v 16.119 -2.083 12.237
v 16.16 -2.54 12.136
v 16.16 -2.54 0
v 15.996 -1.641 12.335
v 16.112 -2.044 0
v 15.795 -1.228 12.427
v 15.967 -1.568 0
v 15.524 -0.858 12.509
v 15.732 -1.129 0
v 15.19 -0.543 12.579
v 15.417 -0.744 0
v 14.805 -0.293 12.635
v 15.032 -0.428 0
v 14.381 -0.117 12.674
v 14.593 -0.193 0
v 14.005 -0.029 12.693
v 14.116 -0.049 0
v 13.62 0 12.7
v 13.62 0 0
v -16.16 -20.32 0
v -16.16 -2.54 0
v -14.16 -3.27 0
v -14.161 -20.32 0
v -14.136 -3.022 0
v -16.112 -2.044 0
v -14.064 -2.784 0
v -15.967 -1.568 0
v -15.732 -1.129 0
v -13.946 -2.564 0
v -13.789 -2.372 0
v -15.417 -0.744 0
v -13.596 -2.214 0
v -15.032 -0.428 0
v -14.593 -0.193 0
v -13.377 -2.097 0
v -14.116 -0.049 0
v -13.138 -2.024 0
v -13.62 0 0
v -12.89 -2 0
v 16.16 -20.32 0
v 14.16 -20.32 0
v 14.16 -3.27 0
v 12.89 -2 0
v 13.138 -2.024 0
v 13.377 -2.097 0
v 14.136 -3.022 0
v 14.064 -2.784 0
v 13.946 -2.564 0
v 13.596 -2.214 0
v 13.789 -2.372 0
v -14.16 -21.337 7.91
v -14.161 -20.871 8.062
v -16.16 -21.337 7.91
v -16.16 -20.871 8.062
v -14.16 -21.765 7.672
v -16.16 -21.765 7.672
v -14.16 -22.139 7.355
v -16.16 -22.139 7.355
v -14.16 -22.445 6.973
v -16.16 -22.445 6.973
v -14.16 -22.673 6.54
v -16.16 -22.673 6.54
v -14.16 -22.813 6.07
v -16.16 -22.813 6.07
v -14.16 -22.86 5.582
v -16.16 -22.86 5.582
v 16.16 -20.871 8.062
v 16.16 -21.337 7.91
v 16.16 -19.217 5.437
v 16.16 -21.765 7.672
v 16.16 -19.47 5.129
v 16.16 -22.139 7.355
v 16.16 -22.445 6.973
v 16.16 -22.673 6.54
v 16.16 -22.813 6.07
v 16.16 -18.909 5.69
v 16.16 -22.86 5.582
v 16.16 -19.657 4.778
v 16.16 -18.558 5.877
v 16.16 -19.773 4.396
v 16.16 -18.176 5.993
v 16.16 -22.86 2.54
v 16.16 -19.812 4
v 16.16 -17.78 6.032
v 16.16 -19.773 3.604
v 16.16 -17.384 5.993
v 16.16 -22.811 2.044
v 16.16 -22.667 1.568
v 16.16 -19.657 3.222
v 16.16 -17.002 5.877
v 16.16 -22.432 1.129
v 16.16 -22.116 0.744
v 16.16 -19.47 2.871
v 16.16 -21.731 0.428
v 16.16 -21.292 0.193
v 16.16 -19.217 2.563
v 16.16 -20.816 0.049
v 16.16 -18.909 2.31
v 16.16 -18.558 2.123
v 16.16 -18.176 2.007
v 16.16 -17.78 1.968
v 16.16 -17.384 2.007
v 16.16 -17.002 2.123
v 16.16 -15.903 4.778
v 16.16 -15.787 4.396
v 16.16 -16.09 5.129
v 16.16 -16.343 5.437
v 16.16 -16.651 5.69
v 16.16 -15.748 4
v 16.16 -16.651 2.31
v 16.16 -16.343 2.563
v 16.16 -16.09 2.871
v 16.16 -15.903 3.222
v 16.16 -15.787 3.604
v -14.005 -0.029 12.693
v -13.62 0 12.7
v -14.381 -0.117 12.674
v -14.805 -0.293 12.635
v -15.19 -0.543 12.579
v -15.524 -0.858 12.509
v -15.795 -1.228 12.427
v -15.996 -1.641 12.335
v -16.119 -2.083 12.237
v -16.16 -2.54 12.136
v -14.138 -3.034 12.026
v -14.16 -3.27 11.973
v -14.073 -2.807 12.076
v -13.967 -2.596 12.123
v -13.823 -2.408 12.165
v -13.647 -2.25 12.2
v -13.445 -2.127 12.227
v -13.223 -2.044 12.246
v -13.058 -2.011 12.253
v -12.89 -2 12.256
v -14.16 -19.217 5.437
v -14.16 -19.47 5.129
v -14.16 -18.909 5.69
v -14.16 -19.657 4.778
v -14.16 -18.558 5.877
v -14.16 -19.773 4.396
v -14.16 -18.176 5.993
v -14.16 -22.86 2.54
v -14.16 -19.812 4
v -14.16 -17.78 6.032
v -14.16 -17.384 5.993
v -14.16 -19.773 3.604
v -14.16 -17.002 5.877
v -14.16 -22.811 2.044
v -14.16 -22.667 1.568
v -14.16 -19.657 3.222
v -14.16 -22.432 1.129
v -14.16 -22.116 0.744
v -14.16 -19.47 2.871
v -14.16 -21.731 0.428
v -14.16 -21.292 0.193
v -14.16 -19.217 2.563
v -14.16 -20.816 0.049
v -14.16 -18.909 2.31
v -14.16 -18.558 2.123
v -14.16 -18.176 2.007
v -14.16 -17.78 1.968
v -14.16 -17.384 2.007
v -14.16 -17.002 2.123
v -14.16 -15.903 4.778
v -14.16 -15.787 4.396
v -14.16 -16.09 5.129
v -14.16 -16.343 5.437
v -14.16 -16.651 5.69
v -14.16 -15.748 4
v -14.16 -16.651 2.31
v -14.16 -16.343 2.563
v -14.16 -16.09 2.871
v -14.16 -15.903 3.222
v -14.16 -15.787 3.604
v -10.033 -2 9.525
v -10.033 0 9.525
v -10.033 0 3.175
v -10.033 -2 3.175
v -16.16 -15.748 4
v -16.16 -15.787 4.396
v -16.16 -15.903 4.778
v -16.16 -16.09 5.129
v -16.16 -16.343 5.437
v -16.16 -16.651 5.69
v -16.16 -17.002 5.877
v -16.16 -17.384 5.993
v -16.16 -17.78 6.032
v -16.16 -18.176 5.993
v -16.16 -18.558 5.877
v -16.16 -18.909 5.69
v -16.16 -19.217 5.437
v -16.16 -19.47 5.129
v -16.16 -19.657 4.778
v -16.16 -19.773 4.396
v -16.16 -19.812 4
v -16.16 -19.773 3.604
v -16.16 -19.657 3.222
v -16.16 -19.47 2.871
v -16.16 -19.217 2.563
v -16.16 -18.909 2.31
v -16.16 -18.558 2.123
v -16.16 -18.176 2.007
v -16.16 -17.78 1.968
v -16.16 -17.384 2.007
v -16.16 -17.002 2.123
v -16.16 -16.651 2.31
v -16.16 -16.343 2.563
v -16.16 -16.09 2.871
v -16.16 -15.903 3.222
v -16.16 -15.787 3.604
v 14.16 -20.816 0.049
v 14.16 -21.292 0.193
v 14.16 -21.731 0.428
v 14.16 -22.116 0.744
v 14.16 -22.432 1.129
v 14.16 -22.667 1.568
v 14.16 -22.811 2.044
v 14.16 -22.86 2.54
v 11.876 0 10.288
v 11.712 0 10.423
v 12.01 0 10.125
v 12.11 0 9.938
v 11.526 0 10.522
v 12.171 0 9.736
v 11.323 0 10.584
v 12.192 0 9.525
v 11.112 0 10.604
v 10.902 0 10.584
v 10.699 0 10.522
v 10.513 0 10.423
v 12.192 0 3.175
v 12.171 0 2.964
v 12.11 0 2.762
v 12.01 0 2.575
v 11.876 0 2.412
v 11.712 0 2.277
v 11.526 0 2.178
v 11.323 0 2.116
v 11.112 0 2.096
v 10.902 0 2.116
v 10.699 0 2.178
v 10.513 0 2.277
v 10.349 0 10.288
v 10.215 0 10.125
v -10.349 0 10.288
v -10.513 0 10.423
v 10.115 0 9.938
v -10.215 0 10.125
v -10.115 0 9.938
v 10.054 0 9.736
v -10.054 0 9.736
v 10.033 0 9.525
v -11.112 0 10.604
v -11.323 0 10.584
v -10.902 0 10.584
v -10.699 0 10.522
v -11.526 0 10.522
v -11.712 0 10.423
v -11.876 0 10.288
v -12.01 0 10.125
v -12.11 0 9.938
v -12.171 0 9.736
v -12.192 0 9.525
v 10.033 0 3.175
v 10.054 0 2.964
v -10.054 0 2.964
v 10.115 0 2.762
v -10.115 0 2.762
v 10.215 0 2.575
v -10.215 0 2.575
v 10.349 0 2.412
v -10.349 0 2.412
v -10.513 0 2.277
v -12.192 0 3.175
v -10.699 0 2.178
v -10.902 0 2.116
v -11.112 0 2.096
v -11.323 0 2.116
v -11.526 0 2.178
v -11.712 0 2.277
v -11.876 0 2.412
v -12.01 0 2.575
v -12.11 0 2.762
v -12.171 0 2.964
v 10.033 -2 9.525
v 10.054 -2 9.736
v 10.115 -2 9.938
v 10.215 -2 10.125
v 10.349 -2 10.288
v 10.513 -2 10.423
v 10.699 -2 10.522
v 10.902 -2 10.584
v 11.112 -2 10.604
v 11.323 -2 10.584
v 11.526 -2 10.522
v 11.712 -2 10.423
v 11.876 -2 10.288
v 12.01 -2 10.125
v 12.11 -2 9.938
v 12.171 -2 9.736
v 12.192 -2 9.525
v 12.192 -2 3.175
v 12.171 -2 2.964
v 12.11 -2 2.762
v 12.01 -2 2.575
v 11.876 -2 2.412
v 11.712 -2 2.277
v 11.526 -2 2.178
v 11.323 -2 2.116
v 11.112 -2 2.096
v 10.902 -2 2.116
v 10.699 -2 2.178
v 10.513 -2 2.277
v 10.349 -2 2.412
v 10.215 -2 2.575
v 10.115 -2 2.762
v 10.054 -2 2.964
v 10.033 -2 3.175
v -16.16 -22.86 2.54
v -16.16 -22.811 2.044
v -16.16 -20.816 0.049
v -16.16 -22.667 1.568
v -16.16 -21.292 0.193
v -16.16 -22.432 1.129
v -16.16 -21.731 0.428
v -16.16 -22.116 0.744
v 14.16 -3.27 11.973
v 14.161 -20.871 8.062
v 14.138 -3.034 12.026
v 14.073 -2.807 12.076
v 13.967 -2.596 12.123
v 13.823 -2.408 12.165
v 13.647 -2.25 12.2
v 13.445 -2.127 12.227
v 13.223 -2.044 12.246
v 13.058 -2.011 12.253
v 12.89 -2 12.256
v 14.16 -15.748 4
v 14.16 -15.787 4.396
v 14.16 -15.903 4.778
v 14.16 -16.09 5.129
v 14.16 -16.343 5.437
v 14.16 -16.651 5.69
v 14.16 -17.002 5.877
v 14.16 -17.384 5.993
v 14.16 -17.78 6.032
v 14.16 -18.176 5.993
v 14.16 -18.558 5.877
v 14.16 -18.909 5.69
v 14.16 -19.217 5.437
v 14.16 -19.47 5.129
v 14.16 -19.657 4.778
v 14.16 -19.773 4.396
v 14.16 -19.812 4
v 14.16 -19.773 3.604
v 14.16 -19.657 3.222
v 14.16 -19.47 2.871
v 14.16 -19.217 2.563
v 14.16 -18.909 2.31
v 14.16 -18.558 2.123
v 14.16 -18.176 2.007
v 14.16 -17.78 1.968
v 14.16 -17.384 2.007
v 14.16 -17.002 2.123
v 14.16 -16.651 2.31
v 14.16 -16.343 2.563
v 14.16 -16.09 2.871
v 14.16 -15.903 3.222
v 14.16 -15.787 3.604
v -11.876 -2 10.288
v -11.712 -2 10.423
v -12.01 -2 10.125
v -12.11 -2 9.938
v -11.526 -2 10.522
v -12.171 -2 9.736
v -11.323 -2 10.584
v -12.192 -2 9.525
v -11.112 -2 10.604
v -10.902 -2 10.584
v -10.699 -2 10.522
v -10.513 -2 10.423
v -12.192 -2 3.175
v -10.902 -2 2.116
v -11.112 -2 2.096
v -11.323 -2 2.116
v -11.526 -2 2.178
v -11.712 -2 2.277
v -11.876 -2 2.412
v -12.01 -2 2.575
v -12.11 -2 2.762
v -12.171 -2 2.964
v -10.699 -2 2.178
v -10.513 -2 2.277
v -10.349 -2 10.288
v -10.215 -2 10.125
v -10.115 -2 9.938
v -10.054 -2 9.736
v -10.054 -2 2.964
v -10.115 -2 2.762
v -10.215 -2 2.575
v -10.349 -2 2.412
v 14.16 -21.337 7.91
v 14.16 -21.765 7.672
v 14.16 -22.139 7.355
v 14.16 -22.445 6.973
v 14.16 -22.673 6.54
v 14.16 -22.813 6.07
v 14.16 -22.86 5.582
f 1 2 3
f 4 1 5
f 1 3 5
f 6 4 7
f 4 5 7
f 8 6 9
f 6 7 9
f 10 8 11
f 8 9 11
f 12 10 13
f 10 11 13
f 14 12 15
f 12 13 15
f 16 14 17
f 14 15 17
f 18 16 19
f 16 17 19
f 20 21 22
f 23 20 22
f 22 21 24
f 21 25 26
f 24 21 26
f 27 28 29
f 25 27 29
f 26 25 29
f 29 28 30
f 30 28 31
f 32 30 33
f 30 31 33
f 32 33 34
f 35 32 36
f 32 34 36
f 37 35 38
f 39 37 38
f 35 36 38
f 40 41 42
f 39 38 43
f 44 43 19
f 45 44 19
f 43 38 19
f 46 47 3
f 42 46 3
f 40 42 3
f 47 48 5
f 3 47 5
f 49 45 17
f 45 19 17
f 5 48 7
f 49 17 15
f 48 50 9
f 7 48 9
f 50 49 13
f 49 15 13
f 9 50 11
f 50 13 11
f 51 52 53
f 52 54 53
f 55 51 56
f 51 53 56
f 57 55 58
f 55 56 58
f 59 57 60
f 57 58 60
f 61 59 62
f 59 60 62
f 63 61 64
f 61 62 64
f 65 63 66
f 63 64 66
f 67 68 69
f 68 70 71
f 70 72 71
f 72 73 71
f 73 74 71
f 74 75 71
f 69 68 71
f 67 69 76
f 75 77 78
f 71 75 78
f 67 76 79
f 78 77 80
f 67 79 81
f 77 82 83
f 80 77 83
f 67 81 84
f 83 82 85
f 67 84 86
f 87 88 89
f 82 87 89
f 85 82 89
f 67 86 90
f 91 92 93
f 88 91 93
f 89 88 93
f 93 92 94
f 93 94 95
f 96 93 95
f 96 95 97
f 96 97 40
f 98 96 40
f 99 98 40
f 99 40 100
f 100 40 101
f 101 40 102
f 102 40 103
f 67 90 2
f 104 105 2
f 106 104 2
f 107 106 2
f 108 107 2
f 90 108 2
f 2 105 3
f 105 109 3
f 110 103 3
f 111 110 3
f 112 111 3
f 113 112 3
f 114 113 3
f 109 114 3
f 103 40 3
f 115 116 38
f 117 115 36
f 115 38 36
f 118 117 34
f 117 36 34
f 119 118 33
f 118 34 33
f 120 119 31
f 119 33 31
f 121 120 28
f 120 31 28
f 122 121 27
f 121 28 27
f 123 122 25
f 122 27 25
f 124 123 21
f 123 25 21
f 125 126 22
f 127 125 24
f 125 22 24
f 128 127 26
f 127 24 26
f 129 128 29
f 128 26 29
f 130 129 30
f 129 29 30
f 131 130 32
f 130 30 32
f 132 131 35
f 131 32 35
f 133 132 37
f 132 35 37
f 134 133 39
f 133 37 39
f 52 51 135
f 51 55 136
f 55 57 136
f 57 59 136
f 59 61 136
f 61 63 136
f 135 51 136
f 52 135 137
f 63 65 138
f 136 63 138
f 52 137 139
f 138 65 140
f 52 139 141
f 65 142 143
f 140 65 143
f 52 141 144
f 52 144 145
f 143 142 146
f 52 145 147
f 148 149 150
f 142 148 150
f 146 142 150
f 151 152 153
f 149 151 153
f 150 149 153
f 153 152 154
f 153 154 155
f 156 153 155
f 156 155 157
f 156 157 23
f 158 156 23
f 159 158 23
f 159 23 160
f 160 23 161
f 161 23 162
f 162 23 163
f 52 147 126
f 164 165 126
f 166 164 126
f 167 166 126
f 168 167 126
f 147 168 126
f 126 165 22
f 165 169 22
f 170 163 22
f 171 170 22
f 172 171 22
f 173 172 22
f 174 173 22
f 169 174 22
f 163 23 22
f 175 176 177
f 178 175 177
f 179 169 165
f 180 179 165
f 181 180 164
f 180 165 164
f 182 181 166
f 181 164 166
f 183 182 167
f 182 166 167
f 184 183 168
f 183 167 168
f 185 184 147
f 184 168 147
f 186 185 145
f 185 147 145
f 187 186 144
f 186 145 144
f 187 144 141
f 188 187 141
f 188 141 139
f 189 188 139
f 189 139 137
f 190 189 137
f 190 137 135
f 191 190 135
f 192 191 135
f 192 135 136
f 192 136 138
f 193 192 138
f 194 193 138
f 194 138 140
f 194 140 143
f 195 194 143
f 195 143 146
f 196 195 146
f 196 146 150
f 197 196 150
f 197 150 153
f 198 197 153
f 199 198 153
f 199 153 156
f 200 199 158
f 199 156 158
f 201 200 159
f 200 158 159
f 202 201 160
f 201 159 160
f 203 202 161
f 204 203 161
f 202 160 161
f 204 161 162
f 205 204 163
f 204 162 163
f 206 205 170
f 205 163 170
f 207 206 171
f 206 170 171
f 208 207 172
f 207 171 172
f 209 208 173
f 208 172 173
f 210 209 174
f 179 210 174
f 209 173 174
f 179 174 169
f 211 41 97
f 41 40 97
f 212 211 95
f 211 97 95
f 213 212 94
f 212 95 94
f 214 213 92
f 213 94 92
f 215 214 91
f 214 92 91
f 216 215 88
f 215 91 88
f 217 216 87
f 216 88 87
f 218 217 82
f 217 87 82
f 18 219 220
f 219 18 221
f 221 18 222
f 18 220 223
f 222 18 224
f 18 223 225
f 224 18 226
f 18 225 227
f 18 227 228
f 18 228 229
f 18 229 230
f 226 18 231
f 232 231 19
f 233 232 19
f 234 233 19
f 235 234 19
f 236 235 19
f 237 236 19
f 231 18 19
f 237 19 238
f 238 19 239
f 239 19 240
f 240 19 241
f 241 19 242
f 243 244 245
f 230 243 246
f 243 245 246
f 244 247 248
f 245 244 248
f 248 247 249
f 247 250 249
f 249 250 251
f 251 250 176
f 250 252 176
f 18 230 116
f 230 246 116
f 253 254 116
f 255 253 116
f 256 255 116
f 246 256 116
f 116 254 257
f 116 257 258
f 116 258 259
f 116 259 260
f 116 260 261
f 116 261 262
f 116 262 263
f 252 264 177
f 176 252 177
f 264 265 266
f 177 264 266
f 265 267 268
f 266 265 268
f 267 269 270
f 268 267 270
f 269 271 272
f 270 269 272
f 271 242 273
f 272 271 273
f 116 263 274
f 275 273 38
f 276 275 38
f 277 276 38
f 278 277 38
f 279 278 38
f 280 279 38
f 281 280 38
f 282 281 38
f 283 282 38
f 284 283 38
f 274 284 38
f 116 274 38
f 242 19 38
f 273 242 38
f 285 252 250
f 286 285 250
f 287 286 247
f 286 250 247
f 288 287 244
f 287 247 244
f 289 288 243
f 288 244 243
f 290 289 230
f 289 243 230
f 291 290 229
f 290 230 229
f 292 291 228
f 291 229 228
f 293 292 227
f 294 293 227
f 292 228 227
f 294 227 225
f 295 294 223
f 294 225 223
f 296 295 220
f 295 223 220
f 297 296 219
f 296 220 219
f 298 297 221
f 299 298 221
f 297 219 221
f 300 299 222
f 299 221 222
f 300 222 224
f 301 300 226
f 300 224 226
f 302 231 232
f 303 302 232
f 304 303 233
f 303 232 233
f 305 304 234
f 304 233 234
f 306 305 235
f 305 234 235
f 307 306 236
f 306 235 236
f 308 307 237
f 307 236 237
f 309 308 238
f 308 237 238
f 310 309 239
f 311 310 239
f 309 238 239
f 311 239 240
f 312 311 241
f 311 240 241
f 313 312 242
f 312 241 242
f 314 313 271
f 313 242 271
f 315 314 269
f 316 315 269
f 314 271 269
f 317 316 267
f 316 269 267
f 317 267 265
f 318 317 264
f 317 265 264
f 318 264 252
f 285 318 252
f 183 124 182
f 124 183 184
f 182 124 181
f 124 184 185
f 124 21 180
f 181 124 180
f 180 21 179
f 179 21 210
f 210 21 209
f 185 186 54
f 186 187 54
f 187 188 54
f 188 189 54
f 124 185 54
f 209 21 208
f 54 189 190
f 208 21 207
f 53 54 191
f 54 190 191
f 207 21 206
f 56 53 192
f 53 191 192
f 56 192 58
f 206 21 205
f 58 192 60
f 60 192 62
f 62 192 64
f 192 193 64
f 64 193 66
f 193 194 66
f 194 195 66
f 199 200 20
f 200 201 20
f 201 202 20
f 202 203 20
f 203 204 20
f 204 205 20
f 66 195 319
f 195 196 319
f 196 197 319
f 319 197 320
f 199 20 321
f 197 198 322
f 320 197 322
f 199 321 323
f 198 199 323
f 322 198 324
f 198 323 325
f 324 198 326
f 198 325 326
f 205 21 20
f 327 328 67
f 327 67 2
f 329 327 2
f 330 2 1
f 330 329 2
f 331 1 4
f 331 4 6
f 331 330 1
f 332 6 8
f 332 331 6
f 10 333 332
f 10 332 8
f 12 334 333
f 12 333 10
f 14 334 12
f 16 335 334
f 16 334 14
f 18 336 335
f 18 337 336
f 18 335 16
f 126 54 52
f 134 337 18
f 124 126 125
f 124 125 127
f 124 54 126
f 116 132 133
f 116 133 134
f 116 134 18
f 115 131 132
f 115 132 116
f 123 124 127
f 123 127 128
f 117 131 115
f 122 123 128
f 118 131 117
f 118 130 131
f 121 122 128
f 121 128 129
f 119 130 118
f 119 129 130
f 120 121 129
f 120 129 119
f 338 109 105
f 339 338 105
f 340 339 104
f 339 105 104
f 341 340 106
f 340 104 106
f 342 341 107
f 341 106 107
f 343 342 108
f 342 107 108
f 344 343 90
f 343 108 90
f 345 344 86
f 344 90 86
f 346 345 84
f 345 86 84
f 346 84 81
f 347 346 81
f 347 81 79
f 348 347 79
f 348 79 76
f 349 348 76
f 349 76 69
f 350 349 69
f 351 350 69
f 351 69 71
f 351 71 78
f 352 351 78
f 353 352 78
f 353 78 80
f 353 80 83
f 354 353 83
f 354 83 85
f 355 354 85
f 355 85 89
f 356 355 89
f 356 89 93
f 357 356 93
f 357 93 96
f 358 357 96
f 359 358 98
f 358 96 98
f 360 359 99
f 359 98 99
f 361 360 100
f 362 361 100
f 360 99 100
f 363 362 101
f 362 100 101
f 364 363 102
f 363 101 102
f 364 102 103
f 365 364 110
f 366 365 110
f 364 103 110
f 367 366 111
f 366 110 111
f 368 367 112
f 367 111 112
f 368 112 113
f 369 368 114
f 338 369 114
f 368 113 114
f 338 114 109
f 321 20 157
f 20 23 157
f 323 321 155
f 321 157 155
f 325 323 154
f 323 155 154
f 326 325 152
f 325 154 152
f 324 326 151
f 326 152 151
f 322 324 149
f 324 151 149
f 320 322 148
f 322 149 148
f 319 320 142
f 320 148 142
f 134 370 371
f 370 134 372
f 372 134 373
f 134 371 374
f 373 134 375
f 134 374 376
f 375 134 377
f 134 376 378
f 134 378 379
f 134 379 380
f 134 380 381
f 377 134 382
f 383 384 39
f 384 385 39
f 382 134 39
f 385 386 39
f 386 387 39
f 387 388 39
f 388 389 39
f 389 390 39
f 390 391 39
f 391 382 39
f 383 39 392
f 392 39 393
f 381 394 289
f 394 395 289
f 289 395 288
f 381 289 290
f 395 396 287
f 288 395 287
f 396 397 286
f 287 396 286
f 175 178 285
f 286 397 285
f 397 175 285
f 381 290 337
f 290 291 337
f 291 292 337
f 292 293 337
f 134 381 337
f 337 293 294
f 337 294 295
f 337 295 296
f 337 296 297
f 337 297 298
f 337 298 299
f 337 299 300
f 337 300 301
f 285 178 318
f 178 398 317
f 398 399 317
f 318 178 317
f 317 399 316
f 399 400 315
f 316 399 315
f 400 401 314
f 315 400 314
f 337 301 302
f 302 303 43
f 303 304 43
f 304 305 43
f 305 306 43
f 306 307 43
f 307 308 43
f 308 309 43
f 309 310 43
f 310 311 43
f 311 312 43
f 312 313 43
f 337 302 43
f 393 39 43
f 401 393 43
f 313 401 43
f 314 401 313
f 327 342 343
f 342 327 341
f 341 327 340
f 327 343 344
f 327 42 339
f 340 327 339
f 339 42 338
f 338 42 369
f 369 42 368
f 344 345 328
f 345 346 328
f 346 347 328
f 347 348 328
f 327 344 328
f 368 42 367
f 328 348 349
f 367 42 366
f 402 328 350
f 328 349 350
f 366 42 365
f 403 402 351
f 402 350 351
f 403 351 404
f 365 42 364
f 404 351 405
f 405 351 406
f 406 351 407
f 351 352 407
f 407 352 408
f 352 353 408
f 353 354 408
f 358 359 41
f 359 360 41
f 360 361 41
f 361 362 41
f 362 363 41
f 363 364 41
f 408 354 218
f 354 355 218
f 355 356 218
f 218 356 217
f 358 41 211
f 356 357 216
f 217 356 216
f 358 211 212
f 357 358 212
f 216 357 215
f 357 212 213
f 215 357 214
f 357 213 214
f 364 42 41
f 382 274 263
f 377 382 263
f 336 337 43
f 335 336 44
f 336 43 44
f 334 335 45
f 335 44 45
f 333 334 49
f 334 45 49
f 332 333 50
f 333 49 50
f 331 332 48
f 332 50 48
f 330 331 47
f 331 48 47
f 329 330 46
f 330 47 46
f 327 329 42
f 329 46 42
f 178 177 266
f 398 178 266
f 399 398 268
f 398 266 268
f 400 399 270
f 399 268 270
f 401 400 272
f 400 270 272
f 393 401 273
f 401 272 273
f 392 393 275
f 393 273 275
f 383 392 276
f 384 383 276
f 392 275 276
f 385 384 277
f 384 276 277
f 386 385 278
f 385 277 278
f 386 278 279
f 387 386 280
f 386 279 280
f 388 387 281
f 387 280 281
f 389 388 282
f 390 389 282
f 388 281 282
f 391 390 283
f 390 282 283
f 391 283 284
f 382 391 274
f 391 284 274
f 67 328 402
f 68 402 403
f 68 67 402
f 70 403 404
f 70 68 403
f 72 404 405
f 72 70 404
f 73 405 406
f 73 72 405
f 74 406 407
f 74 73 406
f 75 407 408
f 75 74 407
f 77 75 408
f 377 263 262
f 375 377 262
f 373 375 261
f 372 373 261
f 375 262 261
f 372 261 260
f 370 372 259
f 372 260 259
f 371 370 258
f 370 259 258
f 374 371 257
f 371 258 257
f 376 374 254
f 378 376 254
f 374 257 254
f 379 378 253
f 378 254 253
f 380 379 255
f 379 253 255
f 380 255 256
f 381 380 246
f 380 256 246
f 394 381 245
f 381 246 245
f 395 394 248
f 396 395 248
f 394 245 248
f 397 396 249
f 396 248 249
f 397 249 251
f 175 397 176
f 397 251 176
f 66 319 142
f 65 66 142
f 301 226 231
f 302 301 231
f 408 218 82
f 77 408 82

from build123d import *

# Parameters (mm, degrees)
F1_DEPTH      = 12.7
F3_DEPTH      = 16.1615
F3_DEPTH_BACK = 16.1615
F4_R          = 2.032
F5_DEPTH      = 32.322
F5_DEPTH_BACK = 60
F6_R          = 2.54
F8_DEPTH      = 22.861


# Not quite as in the source:
# - an extrude ends at something that could not be found from the text; its depth is read off the source's solid
# - a feature names something its author has since deleted; it is built from what else it names


with BuildPart() as f1:
    # F0 (on Top) → F1 (new body)
    with BuildSketch(Plane.XY):
        with BuildLine():
            Line((13.6205, 0), (0, 0))
            Line((0, 0), (-13.6205, 0))
            ThreePointArc((-13.6205, 0), (-15.4165512242, -0.7439487758), (-16.1605, -2.54))
            Line((-16.1605, -2.54), (-16.1605, -22.86))
            Line((-16.1605, -22.86), (-14.1605, -22.86))
            Line((-14.1605, -22.86), (-14.1605, -3.27))
            ThreePointArc((-14.1605, -3.27), (-13.7885256121, -2.3719743879), (-12.8905, -2))
            Line((-12.8905, -2), (0, -2))
            Line((0, -2), (12.8905, -2))
            ThreePointArc((12.8905, -2), (13.7885256121, -2.3719743879), (14.1605, -3.27))
            Line((14.1605, -3.27), (14.1605, -22.86))
            Line((14.1605, -22.86), (16.1605, -22.86))
            Line((16.1605, -22.86), (16.1605, -2.54))
            ThreePointArc((16.1605, -2.54), (15.4165512242, -0.7439487758), (13.6205, 0))
        make_face()
    extrude(amount=F1_DEPTH)

    # F2 (on Right) → F3 (cut, two sides)
    with BuildSketch(Plane.YZ) as f3_sk:
        Polygon((0, 12.7), (-2.54, 12.7), (-22.86, 12.7), (-22.86, 7.62), align=None)
    extrude(amount=-F3_DEPTH, mode=Mode.SUBTRACT)
    extrude(f3_sk.sketch, amount=F3_DEPTH_BACK, mode=Mode.SUBTRACT)

    # F4 (on face) → F5 (cut, two sides)
    with BuildSketch(Plane.YZ.offset(16.1605)) as f5_sk:
        with Locations((-17.78, 4)):
            Circle(F4_R)
    extrude(amount=-F5_DEPTH, mode=Mode.SUBTRACT)
    extrude(f5_sk.sketch, amount=F5_DEPTH_BACK, mode=Mode.SUBTRACT)

    # F6
    f6_edges = [f1.edges().sort_by_distance(p)[0] for p in [
        (15.1605, -22.86, 7.62),
        (-15.1605, -22.86, 7.62),
        (-15.1605, -22.86, 0),
        (15.1605, -22.86, 0),
    ]]
    fillet(f6_edges, radius=F6_R)

    # F7 (on face) → F8 (cut, through all)
    with BuildSketch(Plane(origin=(0, 0, 0), x_dir=(-1, 0, 0), z_dir=(0, 1, 0))):
        with BuildLine():
            Line((-10.033, 3.175), (-10.033, 9.525))
            ThreePointArc((-10.033, 9.525), (-11.1125, 10.6045), (-12.192, 9.525))
            Line((-12.192, 9.525), (-12.192, 3.175))
            ThreePointArc((-12.192, 3.175), (-11.1125, 2.0955), (-10.033, 3.175))
        make_face()
        with BuildLine():
            ThreePointArc((10.033, 3.175), (11.1125, 2.0955), (12.192, 3.175))
            Line((12.192, 3.175), (12.192, 9.525))
            ThreePointArc((12.192, 9.525), (11.1125, 10.6045), (10.033, 9.525))
            Line((10.033, 9.525), (10.033, 3.175))
        make_face()
    extrude(amount=-F8_DEPTH, mode=Mode.SUBTRACT)


solid = f1.part
